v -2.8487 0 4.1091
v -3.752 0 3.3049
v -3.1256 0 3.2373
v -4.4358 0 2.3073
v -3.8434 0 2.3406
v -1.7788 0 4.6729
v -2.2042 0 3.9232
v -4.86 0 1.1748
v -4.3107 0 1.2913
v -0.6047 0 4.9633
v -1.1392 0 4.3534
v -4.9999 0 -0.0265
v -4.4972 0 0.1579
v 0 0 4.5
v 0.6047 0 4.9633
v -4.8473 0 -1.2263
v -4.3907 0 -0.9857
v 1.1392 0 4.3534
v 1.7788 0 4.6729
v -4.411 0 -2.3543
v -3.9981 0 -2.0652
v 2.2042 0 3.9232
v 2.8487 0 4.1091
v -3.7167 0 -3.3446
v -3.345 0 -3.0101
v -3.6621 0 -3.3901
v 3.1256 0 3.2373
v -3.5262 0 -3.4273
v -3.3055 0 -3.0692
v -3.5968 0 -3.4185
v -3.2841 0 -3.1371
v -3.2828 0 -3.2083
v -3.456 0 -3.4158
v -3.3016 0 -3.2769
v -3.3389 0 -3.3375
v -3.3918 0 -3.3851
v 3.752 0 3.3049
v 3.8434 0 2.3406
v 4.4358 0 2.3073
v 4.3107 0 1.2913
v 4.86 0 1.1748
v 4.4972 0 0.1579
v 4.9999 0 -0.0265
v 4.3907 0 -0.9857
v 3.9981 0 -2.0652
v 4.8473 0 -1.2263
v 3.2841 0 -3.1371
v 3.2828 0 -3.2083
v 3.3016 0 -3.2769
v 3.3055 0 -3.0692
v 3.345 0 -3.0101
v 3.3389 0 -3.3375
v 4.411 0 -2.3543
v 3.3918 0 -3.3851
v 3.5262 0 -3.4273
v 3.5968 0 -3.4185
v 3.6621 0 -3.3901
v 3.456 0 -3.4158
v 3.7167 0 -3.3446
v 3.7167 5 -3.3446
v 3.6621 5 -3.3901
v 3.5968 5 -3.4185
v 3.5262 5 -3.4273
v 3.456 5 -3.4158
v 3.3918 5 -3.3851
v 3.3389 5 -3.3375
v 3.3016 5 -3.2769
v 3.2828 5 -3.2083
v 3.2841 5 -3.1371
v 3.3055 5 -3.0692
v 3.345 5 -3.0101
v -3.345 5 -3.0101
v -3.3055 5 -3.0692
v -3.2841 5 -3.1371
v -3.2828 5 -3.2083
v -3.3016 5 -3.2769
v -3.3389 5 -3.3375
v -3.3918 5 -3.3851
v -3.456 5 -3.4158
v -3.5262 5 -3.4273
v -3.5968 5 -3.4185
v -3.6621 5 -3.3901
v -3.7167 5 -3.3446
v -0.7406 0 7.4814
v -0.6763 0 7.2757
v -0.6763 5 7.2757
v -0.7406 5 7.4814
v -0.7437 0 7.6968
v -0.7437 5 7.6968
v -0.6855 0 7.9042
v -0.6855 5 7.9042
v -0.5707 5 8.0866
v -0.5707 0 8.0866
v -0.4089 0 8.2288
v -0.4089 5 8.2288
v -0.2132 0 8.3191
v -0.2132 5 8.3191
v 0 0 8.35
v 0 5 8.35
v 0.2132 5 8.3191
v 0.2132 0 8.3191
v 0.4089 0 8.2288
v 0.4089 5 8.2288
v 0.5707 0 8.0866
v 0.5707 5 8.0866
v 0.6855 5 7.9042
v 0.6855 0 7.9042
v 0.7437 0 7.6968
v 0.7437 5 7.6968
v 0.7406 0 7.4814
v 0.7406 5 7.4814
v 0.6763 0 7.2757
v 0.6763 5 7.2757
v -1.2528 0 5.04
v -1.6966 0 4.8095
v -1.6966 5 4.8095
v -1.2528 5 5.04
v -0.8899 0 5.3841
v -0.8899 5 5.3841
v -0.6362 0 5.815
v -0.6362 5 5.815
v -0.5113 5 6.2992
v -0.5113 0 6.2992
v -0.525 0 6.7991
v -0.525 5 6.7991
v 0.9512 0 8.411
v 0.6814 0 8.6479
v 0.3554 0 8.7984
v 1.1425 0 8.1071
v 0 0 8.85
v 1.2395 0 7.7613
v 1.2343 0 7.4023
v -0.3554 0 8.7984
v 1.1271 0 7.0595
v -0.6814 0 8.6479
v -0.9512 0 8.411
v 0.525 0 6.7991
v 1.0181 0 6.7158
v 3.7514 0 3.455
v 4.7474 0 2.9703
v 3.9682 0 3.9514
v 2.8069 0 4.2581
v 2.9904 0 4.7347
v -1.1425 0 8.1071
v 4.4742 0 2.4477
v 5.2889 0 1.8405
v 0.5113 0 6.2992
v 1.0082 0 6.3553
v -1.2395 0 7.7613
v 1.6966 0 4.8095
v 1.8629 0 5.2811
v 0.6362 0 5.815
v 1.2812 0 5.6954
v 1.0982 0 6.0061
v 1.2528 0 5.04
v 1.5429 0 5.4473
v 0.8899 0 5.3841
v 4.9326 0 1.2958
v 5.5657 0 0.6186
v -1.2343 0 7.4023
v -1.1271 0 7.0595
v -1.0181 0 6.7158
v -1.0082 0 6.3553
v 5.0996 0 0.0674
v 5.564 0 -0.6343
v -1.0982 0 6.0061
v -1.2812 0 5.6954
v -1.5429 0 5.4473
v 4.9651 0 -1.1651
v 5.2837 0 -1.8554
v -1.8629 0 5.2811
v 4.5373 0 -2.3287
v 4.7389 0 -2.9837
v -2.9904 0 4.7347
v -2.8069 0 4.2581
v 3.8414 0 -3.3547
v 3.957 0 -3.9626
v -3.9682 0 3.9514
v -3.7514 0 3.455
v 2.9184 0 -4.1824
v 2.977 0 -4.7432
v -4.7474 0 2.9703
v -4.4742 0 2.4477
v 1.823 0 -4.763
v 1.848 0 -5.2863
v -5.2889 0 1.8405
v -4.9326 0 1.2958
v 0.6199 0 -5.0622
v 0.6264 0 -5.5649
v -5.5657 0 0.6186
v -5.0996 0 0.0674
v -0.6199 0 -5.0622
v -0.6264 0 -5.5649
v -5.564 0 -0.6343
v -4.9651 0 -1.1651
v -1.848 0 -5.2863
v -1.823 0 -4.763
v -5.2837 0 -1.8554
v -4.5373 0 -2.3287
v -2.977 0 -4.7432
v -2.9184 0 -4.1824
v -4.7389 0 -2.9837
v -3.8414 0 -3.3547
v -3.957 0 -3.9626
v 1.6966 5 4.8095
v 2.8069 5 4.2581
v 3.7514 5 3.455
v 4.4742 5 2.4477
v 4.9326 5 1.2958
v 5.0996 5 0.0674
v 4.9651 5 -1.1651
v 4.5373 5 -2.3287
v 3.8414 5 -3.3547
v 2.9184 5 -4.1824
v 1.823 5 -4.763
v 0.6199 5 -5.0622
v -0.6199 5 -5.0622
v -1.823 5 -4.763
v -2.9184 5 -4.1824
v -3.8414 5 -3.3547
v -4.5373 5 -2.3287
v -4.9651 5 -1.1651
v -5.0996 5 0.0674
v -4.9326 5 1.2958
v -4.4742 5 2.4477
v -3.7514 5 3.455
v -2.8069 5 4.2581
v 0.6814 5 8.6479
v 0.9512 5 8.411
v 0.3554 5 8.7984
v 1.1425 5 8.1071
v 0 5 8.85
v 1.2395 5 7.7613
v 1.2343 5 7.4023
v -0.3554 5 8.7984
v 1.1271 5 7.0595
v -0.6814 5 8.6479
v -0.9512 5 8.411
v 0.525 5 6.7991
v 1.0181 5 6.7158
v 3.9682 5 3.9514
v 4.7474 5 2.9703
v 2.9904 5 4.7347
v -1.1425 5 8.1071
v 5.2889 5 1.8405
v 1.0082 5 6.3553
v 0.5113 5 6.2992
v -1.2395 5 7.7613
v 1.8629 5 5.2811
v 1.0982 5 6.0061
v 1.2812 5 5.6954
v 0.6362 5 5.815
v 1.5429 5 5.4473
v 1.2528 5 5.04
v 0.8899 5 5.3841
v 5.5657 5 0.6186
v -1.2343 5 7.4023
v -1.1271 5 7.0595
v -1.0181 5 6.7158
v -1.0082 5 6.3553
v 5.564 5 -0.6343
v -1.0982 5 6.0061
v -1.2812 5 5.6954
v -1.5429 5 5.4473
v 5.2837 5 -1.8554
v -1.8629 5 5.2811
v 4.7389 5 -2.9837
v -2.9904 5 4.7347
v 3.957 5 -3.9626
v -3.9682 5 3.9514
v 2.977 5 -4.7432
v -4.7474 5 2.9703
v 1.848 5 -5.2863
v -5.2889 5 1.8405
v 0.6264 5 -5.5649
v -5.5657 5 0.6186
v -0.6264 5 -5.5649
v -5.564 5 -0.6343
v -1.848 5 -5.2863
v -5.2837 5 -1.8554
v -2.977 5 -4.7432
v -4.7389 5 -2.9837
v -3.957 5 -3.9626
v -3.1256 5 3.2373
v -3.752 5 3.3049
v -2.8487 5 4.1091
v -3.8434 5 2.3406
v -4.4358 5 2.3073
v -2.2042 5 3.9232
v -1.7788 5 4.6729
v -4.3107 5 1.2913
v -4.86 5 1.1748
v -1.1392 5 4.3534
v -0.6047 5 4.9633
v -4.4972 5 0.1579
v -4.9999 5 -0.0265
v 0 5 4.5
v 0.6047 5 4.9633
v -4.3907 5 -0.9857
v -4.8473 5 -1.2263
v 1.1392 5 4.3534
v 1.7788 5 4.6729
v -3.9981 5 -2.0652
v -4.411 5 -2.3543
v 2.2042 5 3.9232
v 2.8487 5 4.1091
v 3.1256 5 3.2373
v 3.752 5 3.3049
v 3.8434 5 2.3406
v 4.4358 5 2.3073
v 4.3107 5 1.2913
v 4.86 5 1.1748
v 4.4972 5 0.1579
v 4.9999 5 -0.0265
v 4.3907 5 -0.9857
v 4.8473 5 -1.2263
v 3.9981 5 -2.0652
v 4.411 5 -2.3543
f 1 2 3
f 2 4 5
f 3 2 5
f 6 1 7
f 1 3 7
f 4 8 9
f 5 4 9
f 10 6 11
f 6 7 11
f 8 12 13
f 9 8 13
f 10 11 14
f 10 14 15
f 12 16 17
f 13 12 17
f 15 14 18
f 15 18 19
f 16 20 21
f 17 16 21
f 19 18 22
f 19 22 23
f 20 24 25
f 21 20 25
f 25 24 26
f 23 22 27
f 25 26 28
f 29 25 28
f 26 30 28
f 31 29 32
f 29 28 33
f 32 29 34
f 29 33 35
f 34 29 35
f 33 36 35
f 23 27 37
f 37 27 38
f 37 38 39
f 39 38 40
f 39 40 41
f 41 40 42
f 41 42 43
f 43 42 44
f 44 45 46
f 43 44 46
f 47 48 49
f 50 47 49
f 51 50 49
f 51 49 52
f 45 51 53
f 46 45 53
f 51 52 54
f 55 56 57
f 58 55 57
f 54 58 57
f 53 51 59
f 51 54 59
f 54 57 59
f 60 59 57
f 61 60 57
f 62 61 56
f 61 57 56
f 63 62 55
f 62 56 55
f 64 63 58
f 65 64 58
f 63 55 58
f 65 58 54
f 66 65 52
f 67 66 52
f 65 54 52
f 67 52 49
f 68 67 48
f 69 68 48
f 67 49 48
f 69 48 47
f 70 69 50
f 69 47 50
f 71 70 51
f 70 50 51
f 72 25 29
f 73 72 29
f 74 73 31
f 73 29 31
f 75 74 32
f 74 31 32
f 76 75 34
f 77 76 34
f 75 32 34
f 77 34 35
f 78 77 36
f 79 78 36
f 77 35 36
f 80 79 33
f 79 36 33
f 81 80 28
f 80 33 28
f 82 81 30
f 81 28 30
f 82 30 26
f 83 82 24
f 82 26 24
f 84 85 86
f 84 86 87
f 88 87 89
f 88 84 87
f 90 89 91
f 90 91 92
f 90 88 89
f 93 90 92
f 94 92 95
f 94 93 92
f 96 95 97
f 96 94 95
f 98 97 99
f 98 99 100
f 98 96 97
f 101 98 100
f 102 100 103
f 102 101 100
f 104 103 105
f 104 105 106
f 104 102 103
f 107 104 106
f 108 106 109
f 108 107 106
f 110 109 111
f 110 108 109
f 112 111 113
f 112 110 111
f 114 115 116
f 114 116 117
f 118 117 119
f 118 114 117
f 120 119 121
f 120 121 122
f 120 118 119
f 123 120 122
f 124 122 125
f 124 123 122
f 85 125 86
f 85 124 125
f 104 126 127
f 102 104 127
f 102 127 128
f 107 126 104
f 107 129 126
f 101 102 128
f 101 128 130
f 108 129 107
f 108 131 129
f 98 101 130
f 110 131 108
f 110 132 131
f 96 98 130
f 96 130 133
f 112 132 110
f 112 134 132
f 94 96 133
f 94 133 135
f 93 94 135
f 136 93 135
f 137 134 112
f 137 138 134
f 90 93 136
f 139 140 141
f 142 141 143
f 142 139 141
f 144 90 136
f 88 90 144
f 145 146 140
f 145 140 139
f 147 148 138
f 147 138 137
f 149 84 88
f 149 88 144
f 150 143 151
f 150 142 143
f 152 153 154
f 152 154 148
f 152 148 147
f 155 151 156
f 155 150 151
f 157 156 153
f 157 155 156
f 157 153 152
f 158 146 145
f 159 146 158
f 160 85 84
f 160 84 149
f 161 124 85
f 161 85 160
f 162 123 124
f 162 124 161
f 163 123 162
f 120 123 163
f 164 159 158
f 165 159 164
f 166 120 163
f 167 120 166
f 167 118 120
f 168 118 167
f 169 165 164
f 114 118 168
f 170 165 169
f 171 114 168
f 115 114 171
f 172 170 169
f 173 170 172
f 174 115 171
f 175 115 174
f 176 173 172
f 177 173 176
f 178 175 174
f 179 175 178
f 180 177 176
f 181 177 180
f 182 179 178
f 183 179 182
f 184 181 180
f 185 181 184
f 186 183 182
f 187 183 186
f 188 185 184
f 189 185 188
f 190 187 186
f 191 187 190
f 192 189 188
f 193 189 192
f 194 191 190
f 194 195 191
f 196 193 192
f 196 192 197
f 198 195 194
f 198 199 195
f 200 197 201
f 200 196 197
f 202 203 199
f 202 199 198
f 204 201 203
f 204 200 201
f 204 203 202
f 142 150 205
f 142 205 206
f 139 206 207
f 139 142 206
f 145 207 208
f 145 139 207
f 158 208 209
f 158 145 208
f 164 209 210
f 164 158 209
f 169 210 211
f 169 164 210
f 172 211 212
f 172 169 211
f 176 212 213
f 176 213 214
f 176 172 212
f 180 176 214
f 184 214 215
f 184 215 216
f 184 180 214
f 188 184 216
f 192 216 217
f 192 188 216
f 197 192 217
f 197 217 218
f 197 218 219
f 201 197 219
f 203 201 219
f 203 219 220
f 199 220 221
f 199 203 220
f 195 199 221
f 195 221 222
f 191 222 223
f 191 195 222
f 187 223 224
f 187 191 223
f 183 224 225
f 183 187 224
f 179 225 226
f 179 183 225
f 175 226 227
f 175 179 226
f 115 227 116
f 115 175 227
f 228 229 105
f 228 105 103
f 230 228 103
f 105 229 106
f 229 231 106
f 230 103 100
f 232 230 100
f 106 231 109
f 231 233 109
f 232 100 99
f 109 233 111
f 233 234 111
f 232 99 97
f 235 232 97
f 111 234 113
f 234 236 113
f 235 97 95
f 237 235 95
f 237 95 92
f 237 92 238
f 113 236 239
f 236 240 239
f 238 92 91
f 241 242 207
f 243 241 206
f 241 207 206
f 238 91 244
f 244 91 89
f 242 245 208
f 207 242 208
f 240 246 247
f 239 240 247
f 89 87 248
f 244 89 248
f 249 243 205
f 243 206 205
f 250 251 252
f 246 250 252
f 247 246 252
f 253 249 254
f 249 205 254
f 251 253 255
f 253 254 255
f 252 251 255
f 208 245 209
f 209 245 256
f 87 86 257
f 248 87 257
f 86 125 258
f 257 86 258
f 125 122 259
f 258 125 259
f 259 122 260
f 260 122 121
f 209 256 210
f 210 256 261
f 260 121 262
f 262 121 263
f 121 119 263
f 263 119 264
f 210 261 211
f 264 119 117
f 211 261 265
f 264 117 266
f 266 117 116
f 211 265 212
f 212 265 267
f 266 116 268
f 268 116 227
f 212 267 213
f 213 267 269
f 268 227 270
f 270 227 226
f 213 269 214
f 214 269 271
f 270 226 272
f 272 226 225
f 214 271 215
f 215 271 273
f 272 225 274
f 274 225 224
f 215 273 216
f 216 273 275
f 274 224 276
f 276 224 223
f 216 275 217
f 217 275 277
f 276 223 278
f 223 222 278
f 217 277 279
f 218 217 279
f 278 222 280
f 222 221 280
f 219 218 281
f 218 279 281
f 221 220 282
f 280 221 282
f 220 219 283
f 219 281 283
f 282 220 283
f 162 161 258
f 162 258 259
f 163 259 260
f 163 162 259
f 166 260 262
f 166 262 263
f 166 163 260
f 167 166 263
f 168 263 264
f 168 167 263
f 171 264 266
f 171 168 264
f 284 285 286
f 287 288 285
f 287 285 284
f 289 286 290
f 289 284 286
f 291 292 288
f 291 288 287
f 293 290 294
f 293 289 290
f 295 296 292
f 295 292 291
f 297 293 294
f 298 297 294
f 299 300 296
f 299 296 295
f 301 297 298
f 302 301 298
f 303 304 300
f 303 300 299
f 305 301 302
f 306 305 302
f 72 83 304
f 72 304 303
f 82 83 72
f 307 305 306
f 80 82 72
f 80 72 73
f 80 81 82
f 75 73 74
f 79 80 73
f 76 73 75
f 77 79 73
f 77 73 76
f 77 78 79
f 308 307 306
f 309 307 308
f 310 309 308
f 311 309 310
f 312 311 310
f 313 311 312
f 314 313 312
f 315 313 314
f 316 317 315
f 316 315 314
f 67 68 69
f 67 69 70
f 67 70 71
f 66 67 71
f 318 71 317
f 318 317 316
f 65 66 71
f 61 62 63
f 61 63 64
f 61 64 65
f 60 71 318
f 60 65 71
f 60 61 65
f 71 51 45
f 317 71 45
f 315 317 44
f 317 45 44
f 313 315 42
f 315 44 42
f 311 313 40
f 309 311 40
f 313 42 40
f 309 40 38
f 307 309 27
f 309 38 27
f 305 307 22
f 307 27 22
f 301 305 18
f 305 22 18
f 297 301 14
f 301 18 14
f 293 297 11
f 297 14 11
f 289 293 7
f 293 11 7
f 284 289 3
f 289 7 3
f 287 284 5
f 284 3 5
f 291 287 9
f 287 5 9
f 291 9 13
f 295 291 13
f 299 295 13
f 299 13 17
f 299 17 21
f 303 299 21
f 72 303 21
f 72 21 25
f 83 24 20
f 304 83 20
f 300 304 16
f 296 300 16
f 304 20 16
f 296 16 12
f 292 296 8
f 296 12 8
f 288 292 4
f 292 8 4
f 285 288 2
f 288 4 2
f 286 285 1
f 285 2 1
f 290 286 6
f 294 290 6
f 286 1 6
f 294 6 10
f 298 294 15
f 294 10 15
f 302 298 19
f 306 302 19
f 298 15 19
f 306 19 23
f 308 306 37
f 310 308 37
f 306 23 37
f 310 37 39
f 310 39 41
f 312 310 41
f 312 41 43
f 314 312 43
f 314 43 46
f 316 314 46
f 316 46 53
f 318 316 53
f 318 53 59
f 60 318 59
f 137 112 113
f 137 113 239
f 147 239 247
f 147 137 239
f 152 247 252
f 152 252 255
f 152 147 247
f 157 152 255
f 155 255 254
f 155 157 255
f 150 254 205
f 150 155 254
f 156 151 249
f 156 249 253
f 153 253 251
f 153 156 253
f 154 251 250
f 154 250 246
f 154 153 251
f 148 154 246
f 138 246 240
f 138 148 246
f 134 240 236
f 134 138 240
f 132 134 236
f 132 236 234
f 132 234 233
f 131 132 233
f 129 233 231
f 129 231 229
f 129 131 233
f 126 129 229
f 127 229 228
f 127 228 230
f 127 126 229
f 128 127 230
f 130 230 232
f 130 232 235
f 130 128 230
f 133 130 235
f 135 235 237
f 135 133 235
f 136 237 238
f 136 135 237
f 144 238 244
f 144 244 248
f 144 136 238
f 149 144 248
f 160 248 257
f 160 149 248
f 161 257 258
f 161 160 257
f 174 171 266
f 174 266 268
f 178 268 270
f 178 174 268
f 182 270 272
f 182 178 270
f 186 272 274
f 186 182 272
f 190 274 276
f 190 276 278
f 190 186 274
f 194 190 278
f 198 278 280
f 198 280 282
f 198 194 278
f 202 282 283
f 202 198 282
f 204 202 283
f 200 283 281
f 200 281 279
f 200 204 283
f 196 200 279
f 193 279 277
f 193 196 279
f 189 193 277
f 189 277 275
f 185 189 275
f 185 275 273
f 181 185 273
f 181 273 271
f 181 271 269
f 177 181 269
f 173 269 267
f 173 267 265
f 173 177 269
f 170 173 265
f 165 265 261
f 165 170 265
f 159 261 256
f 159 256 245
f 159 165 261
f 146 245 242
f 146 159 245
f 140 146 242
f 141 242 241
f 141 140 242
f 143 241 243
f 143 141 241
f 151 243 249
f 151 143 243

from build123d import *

# Parameters (mm, degrees)
EXTRUDE_1_DEPTH   = 5
EXTRUDE_1_2_DEPTH = 5


with BuildPart() as part:
    # Эскиз1 → Бобышка-Вытянуть1 (new body)
    with BuildSketch(Plane(origin=(0, 0, 0), x_dir=(1, 0, 0), z_dir=(0, 1, 0))):
        with BuildLine():
            ThreePointArc((-3.716714381, 3.344552917), (0, -5), (3.716714381, 3.344552917))
            ThreePointArc((3.716714381, 3.344552917), (3.363651016, 3.36316099), (3.345042943, 3.010097625))
            ThreePointArc((3.345042943, 3.010097625), (0, -4.5), (-3.345042943, 3.010097625))
            ThreePointArc((-3.345042943, 3.010097625), (-3.363651016, 3.36316099), (-3.716714381, 3.344552917))
        make_face()
    extrude(amount=EXTRUDE_1_DEPTH)


with BuildPart() as body_2:
    # Эскиз1 → Extrude 1 2 (new body)
    with BuildSketch(Plane(origin=(0, 0, 0), x_dir=(1, 0, 0), z_dir=(0, 1, 0))):
        with BuildLine():
            ThreePointArc((-1.12711488, -7.059526089), (-1.098214776, -6.006138923), (-1.86288923, -5.281064639))
            ThreePointArc((-1.86288923, -5.281064639), (0, 5.6), (1.86288923, -5.281064639))
            ThreePointArc((1.86288923, -5.281064639), (1.098214776, -6.006138923), (1.12711488, -7.059526089))
            ThreePointArc((1.12711488, -7.059526089), (0, -8.85), (-1.12711488, -7.059526089))
        make_face()
        with BuildLine():
            ThreePointArc((-0.676268928, -7.275715654), (0, -8.35), (0.676268928, -7.275715654))
            ThreePointArc((0.676268928, -7.275715654), (0.636193444, -5.814994243), (1.696559835, -4.80954101))
            ThreePointArc((1.696559835, -4.80954101), (0, 5.1), (-1.696559835, -4.80954101))
            ThreePointArc((-1.696559835, -4.80954101), (-0.636193444, -5.814994243), (-0.676268928, -7.275715654))
        make_face(mode=Mode.SUBTRACT)
    extrude(amount=EXTRUDE_1_2_DEPTH)


solid = Compound([part.part, body_2.part])
